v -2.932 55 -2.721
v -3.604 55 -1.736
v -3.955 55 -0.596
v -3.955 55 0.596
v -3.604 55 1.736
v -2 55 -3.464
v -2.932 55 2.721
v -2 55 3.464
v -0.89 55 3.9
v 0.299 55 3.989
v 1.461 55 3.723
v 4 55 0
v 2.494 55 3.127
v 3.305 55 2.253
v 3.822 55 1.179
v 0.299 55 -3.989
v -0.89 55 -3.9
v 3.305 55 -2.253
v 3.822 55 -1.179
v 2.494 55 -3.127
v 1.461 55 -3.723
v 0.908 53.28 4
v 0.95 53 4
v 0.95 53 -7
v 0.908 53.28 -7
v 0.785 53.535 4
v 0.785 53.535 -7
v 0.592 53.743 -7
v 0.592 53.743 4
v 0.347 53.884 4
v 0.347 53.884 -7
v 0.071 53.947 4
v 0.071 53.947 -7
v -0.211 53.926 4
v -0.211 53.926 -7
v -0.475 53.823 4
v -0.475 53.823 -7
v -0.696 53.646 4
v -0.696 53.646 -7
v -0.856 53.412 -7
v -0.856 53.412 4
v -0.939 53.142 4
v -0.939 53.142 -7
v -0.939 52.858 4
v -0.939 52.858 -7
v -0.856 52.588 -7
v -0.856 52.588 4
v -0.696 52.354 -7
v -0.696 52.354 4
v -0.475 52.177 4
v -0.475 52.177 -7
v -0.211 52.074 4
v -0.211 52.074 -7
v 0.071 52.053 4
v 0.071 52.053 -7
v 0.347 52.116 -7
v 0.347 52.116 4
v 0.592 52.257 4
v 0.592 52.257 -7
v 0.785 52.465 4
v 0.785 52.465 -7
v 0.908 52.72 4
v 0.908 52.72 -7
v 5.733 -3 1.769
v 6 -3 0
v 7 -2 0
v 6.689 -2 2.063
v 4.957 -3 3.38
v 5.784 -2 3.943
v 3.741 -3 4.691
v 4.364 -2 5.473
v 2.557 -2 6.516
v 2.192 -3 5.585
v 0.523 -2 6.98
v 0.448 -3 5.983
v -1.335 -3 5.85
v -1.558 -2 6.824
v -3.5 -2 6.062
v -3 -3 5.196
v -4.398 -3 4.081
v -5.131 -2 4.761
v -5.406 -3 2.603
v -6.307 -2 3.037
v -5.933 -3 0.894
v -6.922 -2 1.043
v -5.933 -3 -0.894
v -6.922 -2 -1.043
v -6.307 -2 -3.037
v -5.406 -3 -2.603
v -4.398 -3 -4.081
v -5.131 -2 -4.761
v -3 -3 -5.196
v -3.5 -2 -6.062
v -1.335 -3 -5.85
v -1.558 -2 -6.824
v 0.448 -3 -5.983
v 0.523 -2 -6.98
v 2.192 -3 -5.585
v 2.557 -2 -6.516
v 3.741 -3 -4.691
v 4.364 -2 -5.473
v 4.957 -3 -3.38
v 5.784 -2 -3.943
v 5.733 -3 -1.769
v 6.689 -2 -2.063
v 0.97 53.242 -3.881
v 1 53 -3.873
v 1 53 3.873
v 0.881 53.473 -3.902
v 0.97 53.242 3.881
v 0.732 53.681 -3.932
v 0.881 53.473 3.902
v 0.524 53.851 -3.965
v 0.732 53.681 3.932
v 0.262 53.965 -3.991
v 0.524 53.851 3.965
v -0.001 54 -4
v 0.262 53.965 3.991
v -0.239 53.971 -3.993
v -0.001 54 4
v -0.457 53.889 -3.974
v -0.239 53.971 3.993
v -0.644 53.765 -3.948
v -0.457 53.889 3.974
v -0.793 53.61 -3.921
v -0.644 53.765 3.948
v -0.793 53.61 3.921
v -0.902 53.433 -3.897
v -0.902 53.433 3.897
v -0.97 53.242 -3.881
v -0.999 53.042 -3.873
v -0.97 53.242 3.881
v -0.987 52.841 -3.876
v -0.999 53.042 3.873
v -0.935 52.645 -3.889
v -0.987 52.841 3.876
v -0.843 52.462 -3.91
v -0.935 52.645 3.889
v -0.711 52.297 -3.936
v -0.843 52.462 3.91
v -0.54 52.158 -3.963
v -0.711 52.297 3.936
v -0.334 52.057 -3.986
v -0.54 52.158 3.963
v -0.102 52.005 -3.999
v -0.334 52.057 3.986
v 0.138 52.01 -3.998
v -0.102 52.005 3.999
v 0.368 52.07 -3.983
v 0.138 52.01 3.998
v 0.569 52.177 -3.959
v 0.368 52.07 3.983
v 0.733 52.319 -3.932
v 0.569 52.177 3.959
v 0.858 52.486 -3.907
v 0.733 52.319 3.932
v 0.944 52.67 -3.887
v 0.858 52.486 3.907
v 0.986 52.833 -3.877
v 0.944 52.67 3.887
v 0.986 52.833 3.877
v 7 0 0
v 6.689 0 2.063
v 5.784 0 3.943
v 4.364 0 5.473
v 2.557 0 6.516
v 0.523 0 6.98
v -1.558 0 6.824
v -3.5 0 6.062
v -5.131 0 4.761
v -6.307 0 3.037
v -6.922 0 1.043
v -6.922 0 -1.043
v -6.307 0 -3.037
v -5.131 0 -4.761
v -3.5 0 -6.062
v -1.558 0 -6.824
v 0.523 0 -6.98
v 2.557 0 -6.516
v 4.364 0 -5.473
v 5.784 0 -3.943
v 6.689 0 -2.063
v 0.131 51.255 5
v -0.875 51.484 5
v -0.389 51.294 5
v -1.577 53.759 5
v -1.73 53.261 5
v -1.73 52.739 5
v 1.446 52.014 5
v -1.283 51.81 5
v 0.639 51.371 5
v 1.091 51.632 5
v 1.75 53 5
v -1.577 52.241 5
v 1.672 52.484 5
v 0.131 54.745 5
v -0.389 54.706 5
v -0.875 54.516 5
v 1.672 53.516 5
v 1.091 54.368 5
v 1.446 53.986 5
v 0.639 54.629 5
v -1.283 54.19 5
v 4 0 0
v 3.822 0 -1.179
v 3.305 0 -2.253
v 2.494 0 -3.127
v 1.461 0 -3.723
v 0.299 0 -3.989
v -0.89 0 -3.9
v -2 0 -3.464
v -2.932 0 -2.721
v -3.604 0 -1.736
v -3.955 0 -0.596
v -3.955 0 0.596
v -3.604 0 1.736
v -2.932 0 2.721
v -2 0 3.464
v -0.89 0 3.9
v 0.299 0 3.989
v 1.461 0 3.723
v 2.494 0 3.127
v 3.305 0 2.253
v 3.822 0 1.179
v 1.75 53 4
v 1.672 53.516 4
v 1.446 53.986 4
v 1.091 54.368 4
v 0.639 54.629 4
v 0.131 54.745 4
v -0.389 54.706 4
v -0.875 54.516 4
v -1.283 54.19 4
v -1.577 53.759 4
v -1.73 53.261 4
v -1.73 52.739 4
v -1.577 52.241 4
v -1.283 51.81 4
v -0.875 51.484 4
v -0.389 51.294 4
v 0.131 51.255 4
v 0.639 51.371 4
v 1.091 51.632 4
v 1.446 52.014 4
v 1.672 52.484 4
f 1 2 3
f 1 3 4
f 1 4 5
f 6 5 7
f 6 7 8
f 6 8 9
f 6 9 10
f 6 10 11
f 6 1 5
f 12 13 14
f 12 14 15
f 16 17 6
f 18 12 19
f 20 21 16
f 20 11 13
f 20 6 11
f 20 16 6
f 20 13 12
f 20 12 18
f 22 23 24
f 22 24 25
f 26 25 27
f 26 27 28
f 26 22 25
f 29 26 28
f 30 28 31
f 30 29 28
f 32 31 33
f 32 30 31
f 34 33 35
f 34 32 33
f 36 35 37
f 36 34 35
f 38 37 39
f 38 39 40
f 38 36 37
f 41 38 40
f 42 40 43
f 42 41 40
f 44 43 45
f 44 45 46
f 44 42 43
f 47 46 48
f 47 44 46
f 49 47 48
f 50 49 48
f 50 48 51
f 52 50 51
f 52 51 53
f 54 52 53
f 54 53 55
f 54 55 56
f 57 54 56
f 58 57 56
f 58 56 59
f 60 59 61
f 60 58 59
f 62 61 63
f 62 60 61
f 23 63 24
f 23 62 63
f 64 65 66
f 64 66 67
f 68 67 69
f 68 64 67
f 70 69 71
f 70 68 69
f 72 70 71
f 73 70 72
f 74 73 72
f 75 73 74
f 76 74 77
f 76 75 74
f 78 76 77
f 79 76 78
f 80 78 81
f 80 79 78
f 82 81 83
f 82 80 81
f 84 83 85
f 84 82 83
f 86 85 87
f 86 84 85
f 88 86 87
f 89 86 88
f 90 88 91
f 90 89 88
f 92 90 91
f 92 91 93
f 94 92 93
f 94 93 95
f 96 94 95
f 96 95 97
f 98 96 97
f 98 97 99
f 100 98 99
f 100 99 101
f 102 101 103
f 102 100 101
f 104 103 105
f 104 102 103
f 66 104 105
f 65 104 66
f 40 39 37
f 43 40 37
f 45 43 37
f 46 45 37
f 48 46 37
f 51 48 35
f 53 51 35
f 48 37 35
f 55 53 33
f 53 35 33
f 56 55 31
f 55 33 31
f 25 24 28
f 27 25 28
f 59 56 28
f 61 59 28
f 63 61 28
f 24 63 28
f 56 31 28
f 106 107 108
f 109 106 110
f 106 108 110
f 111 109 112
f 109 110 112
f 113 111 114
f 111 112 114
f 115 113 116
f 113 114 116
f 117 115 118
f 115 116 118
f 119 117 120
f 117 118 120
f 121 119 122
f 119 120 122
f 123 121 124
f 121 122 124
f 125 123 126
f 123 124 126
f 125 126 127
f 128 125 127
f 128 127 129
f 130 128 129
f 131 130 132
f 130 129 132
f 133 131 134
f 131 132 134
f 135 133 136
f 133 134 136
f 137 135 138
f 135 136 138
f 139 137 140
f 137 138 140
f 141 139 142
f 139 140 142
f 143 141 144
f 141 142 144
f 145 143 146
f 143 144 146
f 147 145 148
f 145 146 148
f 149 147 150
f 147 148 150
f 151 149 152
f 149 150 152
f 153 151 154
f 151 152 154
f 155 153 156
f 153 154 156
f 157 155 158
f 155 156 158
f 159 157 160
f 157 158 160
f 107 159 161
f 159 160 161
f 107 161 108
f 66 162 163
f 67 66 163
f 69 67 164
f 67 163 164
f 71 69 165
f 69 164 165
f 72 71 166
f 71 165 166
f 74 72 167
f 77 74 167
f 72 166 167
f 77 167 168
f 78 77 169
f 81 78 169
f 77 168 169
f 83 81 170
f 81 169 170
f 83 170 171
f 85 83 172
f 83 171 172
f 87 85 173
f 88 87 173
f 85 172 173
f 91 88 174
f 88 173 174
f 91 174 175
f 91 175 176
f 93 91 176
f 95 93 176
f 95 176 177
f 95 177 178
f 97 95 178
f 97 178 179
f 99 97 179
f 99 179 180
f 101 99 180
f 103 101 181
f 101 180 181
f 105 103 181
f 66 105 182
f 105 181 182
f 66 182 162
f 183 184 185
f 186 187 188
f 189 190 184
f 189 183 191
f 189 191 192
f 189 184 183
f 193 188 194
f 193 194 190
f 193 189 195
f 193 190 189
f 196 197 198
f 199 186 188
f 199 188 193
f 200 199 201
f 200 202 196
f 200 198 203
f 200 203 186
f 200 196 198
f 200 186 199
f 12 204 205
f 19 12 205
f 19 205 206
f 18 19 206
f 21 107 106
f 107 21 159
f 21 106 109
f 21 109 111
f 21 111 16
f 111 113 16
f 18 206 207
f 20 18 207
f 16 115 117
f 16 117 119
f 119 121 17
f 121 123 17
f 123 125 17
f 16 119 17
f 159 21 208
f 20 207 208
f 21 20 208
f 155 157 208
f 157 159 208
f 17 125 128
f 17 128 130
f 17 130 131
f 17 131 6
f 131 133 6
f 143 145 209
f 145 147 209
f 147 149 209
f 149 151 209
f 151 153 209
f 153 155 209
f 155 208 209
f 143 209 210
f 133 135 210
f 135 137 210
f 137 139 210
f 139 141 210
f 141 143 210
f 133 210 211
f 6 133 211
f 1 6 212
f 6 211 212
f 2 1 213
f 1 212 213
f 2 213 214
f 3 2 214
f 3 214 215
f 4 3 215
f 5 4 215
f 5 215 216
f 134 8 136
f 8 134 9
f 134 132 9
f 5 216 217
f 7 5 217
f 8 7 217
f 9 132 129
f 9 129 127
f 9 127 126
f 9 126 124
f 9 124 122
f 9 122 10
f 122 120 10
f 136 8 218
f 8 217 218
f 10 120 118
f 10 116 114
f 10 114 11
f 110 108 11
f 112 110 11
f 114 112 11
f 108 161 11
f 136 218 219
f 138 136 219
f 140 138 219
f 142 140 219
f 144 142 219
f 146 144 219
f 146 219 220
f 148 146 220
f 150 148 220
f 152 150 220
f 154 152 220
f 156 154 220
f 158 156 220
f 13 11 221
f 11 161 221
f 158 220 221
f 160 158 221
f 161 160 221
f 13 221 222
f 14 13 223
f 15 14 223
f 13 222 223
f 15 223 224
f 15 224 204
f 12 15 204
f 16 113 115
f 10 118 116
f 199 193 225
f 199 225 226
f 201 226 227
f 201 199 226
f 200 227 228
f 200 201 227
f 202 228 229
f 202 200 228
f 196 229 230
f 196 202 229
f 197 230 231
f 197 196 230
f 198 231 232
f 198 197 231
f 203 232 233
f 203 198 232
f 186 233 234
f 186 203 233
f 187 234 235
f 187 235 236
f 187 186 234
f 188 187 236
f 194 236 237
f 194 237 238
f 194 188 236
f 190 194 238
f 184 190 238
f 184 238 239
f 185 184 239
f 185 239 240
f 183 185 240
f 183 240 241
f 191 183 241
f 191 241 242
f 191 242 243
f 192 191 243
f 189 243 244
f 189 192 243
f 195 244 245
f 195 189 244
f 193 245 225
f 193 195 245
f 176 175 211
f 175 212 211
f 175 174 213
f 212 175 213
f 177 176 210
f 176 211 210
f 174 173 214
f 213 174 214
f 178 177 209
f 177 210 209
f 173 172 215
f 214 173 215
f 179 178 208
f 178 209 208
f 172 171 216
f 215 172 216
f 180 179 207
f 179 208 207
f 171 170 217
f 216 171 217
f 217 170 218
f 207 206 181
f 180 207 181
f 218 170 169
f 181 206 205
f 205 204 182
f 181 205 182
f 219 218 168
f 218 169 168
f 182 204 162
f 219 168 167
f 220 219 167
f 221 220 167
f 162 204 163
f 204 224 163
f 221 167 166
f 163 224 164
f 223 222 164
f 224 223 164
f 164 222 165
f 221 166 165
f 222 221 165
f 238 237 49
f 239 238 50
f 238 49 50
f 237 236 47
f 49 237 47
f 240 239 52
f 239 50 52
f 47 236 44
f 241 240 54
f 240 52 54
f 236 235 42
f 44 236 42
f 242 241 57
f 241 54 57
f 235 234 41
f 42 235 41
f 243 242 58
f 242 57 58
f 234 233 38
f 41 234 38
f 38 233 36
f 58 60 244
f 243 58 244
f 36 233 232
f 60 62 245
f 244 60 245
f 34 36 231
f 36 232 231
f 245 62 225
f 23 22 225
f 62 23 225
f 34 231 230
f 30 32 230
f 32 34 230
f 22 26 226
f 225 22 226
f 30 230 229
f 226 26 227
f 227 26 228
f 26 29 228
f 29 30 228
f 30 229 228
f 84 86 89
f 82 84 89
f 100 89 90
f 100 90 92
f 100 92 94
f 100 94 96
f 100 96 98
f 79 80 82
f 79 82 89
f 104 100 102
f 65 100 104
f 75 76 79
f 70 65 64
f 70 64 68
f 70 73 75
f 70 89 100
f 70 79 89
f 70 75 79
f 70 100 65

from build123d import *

# Parameters (mm, degrees)
SKETCH1_R                = 4
BOSS_EXTRUDE1_DEPTH      = 55
SKETCH2_R                = 7
BOSS_EXTRUDE2_DEPTH      = 3
CHAMFER1_SIZE            = 1
SKETCH3_R                = 1
CUT_EXTRUDE1_DEPTH       = 10
CUT_EXTRUDE1_DEPTH_BACK  = 10
SKETCH4_R                = 0.95
BOSS_EXTRUDE3_DEPTH      = 5
BOSS_EXTRUDE3_DEPTH_BACK = 7
SKETCH5_R                = 1.75
BOSS_EXTRUDE4_DEPTH      = 1


with BuildPart() as part:
    # Sketch1 → Boss-Extrude1 (new body)
    with BuildSketch(Plane(origin=(0, 0, 0), x_dir=(1, 0, 0), z_dir=(0, 1, 0))):
        Circle(SKETCH1_R)
    extrude(amount=BOSS_EXTRUDE1_DEPTH)

    # Sketch2 → Boss-Extrude2 (add)
    with BuildSketch(Plane.XZ):
        Circle(SKETCH2_R)
    extrude(amount=BOSS_EXTRUDE2_DEPTH)

    # Chamfer1
    chamfer1_edges = [part.edges().sort_by_distance(p)[0] for p in [
        (-7, -3, 0),
    ]]
    chamfer(chamfer1_edges, length=CHAMFER1_SIZE)

    # Sketch3 → Cut-Extrude1 (cut, two sides)
    with BuildSketch(Plane.XY) as cut_extrude1_sk:
        with Locations((0, 53)):
            Circle(SKETCH3_R)
    extrude(amount=CUT_EXTRUDE1_DEPTH, mode=Mode.SUBTRACT)
    extrude(cut_extrude1_sk.sketch, amount=-CUT_EXTRUDE1_DEPTH_BACK, mode=Mode.SUBTRACT)


with BuildPart() as body_2:
    # Sketch4 → Boss-Extrude3 (new body, two sides)
    with BuildSketch(Plane.XY) as boss_extrude3_sk:
        with Locations((0, 53)):
            Circle(SKETCH4_R)
    extrude(amount=BOSS_EXTRUDE3_DEPTH)
    extrude(boss_extrude3_sk.sketch, amount=-BOSS_EXTRUDE3_DEPTH_BACK)

    # Sketch5 → Boss-Extrude4 (add)
    with BuildSketch(Plane.XY.offset(5)):
        with Locations((0, 53)):
            Circle(SKETCH5_R)
    extrude(amount=-BOSS_EXTRUDE4_DEPTH)


solid = Compound([part.part, body_2.part])
